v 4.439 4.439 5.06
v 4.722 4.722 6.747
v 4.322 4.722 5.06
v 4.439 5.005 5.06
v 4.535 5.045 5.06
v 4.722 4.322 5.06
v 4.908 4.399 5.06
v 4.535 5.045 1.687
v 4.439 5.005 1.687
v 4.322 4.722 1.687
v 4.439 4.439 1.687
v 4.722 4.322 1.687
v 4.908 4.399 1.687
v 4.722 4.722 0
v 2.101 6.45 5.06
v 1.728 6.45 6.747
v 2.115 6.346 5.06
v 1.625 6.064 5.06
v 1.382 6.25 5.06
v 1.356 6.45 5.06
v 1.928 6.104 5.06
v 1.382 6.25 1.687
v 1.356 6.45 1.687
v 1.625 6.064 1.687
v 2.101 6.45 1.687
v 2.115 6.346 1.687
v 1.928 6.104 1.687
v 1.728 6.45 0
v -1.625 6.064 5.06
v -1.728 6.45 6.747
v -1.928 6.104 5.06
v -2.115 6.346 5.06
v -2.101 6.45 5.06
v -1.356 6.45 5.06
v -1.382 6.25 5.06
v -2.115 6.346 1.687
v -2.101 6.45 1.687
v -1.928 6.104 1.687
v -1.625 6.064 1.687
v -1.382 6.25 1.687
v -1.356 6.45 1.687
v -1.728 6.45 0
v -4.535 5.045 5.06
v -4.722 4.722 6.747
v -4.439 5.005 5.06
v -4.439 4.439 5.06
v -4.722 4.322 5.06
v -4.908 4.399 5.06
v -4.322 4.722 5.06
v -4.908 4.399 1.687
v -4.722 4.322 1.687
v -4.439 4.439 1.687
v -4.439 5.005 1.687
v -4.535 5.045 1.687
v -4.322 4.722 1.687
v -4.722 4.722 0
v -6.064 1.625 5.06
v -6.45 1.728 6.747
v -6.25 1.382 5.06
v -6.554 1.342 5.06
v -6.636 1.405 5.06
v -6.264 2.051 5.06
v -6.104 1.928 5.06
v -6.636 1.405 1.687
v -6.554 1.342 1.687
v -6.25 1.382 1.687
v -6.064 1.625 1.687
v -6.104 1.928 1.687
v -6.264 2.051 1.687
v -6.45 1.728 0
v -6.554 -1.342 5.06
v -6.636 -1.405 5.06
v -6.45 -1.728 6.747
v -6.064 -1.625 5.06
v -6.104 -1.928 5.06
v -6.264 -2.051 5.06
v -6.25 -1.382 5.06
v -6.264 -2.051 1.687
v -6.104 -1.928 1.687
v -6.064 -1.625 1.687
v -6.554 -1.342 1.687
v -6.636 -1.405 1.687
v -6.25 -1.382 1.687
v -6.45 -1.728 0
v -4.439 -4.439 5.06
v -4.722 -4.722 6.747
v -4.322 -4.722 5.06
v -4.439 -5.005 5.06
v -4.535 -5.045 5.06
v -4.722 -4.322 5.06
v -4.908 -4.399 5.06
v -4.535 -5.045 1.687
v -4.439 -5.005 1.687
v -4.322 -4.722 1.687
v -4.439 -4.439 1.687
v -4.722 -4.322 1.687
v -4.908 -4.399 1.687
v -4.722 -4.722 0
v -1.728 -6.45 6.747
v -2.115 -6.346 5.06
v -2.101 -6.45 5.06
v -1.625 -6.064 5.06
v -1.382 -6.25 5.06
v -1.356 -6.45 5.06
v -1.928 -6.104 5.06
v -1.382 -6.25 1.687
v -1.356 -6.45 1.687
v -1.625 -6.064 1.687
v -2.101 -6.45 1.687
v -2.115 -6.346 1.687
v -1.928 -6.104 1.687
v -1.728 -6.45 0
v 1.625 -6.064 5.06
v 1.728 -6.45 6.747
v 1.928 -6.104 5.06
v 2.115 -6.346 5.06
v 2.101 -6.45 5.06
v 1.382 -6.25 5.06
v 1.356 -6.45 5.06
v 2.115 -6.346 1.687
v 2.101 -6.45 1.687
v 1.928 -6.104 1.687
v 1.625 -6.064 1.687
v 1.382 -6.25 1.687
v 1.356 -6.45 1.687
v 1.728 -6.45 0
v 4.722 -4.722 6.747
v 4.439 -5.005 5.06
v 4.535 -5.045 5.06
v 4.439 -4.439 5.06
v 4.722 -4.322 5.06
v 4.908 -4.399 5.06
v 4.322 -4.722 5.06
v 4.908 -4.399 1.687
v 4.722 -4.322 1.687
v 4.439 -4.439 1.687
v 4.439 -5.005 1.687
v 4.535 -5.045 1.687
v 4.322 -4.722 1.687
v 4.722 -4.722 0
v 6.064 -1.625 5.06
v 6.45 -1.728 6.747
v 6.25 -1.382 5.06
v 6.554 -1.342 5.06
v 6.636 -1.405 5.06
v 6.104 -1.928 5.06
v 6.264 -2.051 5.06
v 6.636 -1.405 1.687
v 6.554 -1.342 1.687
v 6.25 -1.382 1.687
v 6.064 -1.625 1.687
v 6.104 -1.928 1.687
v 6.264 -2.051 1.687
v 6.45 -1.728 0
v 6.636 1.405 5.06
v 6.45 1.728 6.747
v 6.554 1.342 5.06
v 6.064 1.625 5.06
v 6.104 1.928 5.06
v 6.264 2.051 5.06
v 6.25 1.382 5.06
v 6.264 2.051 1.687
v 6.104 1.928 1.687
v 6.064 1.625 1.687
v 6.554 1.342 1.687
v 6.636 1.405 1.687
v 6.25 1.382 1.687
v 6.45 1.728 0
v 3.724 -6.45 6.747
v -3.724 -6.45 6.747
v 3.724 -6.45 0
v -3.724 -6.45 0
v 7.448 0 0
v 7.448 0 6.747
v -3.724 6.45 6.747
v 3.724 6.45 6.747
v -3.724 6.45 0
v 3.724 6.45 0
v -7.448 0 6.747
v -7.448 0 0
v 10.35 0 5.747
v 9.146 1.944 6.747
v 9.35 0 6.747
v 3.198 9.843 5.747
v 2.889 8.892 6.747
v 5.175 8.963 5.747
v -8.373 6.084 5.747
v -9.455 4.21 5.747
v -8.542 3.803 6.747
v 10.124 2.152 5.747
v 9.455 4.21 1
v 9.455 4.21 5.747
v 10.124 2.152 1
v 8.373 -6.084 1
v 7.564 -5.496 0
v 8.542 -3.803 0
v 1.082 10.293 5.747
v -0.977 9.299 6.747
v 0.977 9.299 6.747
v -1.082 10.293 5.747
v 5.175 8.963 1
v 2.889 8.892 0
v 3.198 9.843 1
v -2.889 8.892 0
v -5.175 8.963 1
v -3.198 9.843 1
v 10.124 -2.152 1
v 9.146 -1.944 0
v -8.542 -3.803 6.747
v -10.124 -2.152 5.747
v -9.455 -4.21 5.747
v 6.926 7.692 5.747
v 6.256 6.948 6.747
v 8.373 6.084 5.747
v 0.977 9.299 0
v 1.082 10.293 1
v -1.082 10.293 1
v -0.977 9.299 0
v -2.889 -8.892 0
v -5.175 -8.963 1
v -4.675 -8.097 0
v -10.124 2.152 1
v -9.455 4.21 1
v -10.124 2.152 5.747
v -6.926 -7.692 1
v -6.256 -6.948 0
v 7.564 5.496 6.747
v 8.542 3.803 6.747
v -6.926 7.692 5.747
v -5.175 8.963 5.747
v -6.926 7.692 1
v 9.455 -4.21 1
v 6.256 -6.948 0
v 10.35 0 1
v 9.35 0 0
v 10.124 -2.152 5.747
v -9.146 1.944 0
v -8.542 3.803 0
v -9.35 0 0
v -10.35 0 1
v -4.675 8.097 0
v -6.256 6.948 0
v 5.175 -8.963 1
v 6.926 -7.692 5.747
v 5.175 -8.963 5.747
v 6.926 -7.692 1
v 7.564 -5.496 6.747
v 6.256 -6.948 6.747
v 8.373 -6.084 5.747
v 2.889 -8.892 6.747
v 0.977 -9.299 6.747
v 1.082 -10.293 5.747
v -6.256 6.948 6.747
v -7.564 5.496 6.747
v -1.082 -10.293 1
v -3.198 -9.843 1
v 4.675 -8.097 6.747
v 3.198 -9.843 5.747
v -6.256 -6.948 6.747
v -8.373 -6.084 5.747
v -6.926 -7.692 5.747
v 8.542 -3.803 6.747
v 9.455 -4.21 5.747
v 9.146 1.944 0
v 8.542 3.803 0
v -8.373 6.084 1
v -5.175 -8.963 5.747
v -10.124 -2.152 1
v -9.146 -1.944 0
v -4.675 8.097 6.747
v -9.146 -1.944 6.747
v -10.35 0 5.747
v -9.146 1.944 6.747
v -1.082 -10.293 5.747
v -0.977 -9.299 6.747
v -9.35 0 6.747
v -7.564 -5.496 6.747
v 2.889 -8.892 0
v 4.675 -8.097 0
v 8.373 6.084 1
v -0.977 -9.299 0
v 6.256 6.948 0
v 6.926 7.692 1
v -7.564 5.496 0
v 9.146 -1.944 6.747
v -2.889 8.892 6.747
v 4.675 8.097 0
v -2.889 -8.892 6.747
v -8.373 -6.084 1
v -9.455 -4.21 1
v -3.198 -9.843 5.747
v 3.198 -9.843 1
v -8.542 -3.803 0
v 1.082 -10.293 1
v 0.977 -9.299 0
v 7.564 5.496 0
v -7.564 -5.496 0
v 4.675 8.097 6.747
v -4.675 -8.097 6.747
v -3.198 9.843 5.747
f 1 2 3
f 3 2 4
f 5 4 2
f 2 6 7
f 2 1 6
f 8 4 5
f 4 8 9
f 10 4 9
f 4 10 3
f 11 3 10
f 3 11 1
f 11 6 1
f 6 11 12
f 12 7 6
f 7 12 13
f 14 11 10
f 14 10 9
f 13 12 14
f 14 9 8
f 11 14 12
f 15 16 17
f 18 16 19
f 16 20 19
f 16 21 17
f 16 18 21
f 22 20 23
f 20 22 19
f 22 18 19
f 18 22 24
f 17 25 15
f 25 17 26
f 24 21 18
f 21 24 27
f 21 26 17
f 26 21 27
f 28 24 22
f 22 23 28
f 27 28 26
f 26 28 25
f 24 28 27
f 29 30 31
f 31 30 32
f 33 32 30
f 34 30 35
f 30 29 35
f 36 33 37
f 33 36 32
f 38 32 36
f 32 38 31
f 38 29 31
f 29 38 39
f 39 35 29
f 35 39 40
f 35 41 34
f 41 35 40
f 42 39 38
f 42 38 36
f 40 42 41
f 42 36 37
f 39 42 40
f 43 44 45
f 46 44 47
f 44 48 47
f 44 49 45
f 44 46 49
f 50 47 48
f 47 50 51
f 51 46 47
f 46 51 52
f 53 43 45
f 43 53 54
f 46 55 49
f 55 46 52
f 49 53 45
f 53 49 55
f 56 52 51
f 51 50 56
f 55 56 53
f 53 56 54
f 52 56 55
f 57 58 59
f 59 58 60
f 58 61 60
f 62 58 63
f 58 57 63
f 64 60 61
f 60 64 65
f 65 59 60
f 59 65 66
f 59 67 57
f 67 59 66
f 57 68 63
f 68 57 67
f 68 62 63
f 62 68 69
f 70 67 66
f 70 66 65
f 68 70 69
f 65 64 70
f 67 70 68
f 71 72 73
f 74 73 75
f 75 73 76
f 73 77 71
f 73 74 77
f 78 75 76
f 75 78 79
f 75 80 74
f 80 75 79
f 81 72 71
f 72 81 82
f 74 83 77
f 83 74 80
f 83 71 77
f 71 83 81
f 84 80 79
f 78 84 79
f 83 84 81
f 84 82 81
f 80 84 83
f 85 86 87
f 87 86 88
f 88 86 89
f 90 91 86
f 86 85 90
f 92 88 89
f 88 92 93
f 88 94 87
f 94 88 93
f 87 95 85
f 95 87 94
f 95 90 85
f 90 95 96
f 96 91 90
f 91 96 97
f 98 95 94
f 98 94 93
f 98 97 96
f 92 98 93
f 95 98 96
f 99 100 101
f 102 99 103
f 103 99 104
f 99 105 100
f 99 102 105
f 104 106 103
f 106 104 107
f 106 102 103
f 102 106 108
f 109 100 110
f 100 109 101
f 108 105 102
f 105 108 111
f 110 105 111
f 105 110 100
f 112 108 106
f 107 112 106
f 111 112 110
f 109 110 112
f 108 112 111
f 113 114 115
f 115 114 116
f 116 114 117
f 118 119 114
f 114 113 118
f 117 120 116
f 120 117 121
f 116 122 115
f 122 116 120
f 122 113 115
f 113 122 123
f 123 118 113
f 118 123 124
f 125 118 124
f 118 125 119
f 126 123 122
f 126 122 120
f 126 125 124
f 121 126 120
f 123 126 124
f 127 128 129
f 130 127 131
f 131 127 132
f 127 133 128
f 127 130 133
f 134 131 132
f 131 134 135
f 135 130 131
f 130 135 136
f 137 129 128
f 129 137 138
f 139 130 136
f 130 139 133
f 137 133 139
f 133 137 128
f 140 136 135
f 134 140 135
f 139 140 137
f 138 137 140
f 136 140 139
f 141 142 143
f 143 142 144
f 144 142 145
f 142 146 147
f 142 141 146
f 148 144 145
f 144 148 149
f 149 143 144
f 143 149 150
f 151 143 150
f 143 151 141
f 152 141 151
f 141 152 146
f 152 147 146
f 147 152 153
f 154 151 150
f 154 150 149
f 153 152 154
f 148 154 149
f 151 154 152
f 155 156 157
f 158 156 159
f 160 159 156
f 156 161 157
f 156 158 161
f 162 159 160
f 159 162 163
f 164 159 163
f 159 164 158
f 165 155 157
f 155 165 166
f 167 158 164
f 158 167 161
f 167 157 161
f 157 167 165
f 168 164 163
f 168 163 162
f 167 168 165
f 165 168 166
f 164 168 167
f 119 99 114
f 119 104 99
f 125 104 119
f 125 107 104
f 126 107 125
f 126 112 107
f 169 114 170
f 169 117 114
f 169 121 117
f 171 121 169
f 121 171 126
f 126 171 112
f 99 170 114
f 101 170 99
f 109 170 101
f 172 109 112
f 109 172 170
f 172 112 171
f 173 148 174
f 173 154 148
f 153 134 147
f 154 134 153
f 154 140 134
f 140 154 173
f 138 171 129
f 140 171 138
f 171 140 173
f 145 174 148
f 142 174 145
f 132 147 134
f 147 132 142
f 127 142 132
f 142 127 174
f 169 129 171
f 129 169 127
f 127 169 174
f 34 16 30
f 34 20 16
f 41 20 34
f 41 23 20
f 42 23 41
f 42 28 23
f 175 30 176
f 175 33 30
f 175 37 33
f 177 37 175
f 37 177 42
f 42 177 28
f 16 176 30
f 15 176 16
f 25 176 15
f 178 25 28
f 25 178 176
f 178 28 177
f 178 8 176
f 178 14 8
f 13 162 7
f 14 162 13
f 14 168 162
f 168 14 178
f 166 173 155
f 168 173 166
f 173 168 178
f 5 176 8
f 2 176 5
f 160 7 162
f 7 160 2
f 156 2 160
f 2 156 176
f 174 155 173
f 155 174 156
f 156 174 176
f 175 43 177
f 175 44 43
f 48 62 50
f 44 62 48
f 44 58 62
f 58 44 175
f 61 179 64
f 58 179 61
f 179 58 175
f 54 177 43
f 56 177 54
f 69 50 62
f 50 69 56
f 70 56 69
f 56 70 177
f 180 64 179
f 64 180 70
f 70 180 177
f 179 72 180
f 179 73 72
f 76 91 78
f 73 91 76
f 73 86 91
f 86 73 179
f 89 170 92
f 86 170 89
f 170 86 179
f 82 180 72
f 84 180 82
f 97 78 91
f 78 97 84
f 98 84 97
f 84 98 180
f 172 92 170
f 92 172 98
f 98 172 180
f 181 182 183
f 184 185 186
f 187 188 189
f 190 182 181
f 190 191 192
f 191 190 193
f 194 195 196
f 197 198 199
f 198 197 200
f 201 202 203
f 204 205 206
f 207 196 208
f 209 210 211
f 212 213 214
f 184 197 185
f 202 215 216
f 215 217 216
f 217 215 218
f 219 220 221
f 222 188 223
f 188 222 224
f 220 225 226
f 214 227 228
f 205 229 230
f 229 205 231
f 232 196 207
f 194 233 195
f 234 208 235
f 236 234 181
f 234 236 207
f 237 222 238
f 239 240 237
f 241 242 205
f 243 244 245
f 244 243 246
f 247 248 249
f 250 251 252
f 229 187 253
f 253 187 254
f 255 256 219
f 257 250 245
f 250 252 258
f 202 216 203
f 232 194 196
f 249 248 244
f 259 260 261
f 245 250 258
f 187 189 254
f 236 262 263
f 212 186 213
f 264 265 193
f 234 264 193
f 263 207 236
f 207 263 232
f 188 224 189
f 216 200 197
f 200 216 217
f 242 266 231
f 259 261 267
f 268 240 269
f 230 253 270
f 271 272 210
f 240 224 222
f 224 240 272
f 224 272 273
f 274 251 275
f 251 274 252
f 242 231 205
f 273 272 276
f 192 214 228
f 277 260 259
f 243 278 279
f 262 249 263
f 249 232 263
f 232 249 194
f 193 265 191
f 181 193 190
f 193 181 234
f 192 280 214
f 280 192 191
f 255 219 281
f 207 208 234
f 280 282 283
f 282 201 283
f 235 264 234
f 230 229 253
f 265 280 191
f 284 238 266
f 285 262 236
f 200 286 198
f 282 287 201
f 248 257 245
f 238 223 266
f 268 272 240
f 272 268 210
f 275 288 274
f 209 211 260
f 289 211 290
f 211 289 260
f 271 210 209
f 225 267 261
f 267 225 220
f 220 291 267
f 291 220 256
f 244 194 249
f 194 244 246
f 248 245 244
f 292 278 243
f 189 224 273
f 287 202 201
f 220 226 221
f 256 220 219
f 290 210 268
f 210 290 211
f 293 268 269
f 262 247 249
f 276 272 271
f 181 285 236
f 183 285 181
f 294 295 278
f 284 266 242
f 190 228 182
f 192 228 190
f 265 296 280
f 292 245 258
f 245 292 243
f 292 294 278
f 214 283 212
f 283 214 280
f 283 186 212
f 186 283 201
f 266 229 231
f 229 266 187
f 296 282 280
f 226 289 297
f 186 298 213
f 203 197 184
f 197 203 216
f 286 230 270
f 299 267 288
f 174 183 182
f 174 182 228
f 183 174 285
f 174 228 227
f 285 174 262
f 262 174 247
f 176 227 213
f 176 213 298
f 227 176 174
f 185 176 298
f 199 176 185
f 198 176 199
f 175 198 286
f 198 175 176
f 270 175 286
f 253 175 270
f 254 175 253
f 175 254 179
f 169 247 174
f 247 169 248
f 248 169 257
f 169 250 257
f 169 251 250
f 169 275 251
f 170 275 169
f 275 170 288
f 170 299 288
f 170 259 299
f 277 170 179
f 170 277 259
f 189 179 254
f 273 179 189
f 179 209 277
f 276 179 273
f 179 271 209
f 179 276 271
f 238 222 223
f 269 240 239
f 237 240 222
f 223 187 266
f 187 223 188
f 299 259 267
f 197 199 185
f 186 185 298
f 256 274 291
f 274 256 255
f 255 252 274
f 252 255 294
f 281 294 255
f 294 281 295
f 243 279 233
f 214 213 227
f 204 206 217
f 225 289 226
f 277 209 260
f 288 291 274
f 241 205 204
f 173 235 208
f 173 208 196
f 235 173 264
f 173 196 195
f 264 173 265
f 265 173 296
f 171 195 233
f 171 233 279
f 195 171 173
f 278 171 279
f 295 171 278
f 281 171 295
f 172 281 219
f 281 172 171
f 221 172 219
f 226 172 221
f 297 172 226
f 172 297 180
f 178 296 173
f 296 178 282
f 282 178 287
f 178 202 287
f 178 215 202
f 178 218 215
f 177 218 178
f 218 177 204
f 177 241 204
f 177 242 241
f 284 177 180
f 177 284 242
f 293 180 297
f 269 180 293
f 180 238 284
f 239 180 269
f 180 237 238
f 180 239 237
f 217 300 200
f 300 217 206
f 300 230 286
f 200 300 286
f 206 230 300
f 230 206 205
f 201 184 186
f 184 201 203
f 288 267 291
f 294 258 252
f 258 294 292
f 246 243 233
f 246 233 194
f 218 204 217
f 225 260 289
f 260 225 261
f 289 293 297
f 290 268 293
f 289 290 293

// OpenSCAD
// file: shapes/units.scad
function inches_to_mm(inches) = inches * 25.4; //https://www.nist.gov/pml/weights-and-measures/si-units-length
// file: shapes/bearing_race_spline.scad
bearing_race_spline();

module bearing_race_spline(
    h = 10, 
    r = 1,
    taper = 2.5)
{
    cylinder_height = h - (taper * 2);
    
    translate([0,0,taper + cylinder_height])
    cylinder(h = taper, r1 = r, r2 = 0);
    
    translate([0,0,taper])
    cylinder(h = cylinder_height, r = r);
    
    cylinder(h = taper, r1 = 0, r2 = r);
}
// file: shapes/torus.scad
torus();

module torus(
    h = 2,     
    r = 10,   
    sides = $fn)
{
    tube_radius = h / 2;
    inside_radius = r - tube_radius;
    //translate([r,r,thickness_radius])
    translate([0,0,tube_radius])
    rotate_extrude()
    translate([inside_radius, 0, 0])
    circle(r = tube_radius, $fn = sides);
}
// file: shapes/hex_nut_captive_hole.settings.scad
default_clearance = 0.1;
default_spline_qty = 12;
default_spline_depth = 0.4;
default_extra_margin_top = 1;
default_extra_margin_bottom = 1;
// file: shapes/hex_nut.table.scad
include <units.scad>;

function hex_nut_diameter(index) = hex_nut_data(index)[0];
function hex_nut_height(index) = hex_nut_data(index)[1];

// https://www.boltdepot.com/fastener-information/nuts-washers/us-nut-dimensions.aspx
function hex_nut_data(index) = 
    // diameter, height
    index == "1/4"  ? [inches_to_mm(7/16),  inches_to_mm(7/32)] : 
    index == "5/16" ? [inches_to_mm(1/2),   inches_to_mm(17/64)] :
    index == "3/8"  ? [inches_to_mm(9/16),  inches_to_mm(21/64)] :
    index == "7/16" ? [inches_to_mm(11/16), inches_to_mm(3/8)] :
    index == "1/2"  ? [inches_to_mm(3/4),   inches_to_mm(7/16)] :
    index == "9/16" ? [inches_to_mm(7/8),   inches_to_mm(31/64)] :
    index == "5/8"  ? [inches_to_mm(15/16), inches_to_mm(35/64)] :
    index == "3/4"  ? [inches_to_mm(1+(1/8)),  inches_to_mm(41/64)] :
    index == "7/8"  ? [inches_to_mm(1+(5/16)), inches_to_mm(3/4)] :
    index == "1"    ? [inches_to_mm(1+(1/2)),  inches_to_mm(55/64)] :
    "Error";
// file: shapes/polygon_captive_hole.scad
use <bearing_race_spline.scad>;

polygon_captive_hole(d = 30);

module polygon_captive_hole(
    sides = 6,
    h = 10, 
    r = undef,
    d = undef,    
    flat_r = undef,  
    flat_d = undef,
    spline_qty = 12,
    spline_depth = 0.5,
    extra_margin_bottom = 1,
    extra_margin_top = 1)
{
    sides_arc = (360 / sides);
    sides_half_arc = sides_arc / 2;
    splines_arc = (360 / spline_qty);
    splines_half_arc = splines_arc / 2;

    function r() = radius(r, d, flat_r, flat_d, sides);
    function d() = diameter(r, d, flat_r, flat_d, sides);
    function flat_r() = flat_radius(r, d, flat_r, flat_d, sides);
    function flat_d() = flat_diameter(r, d, flat_r, flat_d, sides);
    
    difference()
    {
        translate([0, 0, -extra_margin_bottom])
        cylinder(
            r = r(), 
            h = h + extra_margin_bottom + extra_margin_top, 
            $fn = sides);
            
        splines();
    }
    
    module splines()
    {        
        for (i = [1 : spline_qty])
        {
            angle = (i * splines_arc) + splines_half_arc;
            _spline(angle);
        }

        module _spline(angle)
        {
            half_arc_intersecting_radius = flat_r();
            right_triangle_angle = abs(sides_half_arc - (angle % sides_arc));
            
            distance_from_center = (right_triangle_angle)
                ? half_arc_intersecting_radius / cos(right_triangle_angle)
                : half_arc_intersecting_radius;

            rotate([0, 0, angle])
            translate([distance_from_center, 0, 0])
            bearing_race_spline(
                h = h, 
                r = spline_depth, 
                taper = h / 4, 
                $fn = 8);
        }
    }
}

function radius(r, d, fr, fd, sides) = 
    (r)  ? r : 
    (d)  ? radius_from_diameter(d) : 
    (fr) ? radius_from_flat_radius(fr, sides) : 
    (fd) ? radius_from_flat_diameter(fd, sides) : 
    undef;

function diameter(r, d, fr, fd, sides) = 
    (r)  ? diameter_from_radius(r) :
    (d)  ? d :
    (fr) ? diameter_from_flat_radius(fr, sides) :
    (fd) ? diameter_from_flat_diameter(fd, sides) :
    undef;

function flat_radius(r, d, fr, fd, sides) = 
    (r)  ? flat_radius_from_radius(r, sides) :
    (d)  ? flat_radius_from_diameter(d, sides) :
    (fr) ? fr :
    (fd) ? flat_radius_from_flat_diameter(fd) :
    undef;

function flat_diameter(r, d, fr, fd, sides) = 
    (r)  ? flat_diameter_from_radius(r, sides) :
    (d)  ? flat_diameter_from_diameter(d, sides) :
    (fr) ? flat_diameter_from_flat_radius(fr) :
    (fd) ? fd :     
    undef;

function radius_from_diameter(d) = d / 2;
function radius_from_flat_radius(fr, sides) = fr / cos(360 / sides / 2);
function radius_from_flat_diameter(fd, sides) = radius_from_flat_radius(fd / 2, sides);

function diameter_from_radius(r) = r * 2;
function diameter_from_flat_radius(fr, sides) = radius_from_flat_radius(fr, sides) * 2;
function diameter_from_flat_diameter(fd, sides) = radius_from_flat_radius(fd / 2, sides) * 2; 

function flat_radius_from_flat_diameter(fd) = fd / 2;
function flat_radius_from_radius(r, sides) = cos(360 / sides / 2) * r;
function flat_radius_from_diameter(d, sides) = flat_radius_from_radius(d / 2, sides);

function flat_diameter_from_flat_radius(fr) = fr * 2;
function flat_diameter_from_radius(r, sides) = flat_radius_from_radius(r, sides) * 2;
function flat_diameter_from_diameter(d, sides) = flat_radius_from_radius(d / 2, sides) * 2;
// file: shapes/chamfer_cylinder.scad
use <torus.scad>;

default_chamfer_radius = 1;

chamfer_cylinder();

module chamfer_cylinder(
    h = 10, 
    r = undef,
    d = 10,
    chamfer_radius = undef)
{
    function _chamfer_radius() = (chamfer_radius != undef) ? chamfer_radius : default_chamfer_radius;
    
    function _r() = 
        (r) ? r : 
        (d) ? d / 2 :
        "error";

    hull()
    {
        r = _r();
        chamfer_radius = _chamfer_radius();

        // top chamfer
        translate([0, 0, h-chamfer_radius])
        cylinder(
            h = chamfer_radius, 
            r1 = r,
            r2 = r - chamfer_radius);
        
        // bottom chamfer
        cylinder(
            h = chamfer_radius, 
            r1 = r - chamfer_radius,
            r2 = r);
    }    
}
// file: shapes/hex_nut_captive_hole.scad
use <polygon_captive_hole.scad>;
include <hex_nut.table.scad>;
include <hex_nut_captive_hole.settings.scad>;

hex_nut_captive_hole();

module hex_nut_captive_hole(
    index = "3/8",
    h = undef,
    clearance = undef,
    spline_qty = undef,
    spline_depth = undef,
    extra_margin_bottom = undef,
    extra_margin_top = undef)
{

    function _h() = (h != undef) ? h : hex_nut_height(index);
    function _clearance() = (clearance != undef) ? clearance : default_clearance;
    function _spline_qty() = (spline_qty != undef) ? spline_qty : default_spline_qty;
    function _spline_depth() = (spline_depth != undef) ? spline_depth : default_spline_depth;
    function _extra_margin_bottom() = (extra_margin_bottom != undef) ? extra_margin_bottom : default_extra_margin_bottom;
    function _extra_margin_top() = (extra_margin_top != undef) ? extra_margin_top : default_extra_margin_top;
    
    flat_d = hex_nut_diameter(index) + (_clearance() * 2);

    polygon_captive_hole(
        sides = 6, 
        flat_d = flat_d,
        h = _h(),
        spline_qty = _spline_qty(),
        spline_depth = _spline_depth(),
        extra_margin_bottom = _extra_margin_bottom(),
        extra_margin_top = _extra_margin_top()
    );
}
// main file
use <shapes/hex_nut_captive_hole.scad>;
use <shapes/chamfer_cylinder.scad>;

hex_captive_hole_fit_test();

module hex_captive_hole_fit_test(index = "5/16")
{
    difference()
    {
        d = hex_nut_diameter(index) + 8;
        h = hex_nut_height(index);

        chamfer_cylinder(d = d, h = h);
        hex_nut_captive_hole(index);
    }
}
